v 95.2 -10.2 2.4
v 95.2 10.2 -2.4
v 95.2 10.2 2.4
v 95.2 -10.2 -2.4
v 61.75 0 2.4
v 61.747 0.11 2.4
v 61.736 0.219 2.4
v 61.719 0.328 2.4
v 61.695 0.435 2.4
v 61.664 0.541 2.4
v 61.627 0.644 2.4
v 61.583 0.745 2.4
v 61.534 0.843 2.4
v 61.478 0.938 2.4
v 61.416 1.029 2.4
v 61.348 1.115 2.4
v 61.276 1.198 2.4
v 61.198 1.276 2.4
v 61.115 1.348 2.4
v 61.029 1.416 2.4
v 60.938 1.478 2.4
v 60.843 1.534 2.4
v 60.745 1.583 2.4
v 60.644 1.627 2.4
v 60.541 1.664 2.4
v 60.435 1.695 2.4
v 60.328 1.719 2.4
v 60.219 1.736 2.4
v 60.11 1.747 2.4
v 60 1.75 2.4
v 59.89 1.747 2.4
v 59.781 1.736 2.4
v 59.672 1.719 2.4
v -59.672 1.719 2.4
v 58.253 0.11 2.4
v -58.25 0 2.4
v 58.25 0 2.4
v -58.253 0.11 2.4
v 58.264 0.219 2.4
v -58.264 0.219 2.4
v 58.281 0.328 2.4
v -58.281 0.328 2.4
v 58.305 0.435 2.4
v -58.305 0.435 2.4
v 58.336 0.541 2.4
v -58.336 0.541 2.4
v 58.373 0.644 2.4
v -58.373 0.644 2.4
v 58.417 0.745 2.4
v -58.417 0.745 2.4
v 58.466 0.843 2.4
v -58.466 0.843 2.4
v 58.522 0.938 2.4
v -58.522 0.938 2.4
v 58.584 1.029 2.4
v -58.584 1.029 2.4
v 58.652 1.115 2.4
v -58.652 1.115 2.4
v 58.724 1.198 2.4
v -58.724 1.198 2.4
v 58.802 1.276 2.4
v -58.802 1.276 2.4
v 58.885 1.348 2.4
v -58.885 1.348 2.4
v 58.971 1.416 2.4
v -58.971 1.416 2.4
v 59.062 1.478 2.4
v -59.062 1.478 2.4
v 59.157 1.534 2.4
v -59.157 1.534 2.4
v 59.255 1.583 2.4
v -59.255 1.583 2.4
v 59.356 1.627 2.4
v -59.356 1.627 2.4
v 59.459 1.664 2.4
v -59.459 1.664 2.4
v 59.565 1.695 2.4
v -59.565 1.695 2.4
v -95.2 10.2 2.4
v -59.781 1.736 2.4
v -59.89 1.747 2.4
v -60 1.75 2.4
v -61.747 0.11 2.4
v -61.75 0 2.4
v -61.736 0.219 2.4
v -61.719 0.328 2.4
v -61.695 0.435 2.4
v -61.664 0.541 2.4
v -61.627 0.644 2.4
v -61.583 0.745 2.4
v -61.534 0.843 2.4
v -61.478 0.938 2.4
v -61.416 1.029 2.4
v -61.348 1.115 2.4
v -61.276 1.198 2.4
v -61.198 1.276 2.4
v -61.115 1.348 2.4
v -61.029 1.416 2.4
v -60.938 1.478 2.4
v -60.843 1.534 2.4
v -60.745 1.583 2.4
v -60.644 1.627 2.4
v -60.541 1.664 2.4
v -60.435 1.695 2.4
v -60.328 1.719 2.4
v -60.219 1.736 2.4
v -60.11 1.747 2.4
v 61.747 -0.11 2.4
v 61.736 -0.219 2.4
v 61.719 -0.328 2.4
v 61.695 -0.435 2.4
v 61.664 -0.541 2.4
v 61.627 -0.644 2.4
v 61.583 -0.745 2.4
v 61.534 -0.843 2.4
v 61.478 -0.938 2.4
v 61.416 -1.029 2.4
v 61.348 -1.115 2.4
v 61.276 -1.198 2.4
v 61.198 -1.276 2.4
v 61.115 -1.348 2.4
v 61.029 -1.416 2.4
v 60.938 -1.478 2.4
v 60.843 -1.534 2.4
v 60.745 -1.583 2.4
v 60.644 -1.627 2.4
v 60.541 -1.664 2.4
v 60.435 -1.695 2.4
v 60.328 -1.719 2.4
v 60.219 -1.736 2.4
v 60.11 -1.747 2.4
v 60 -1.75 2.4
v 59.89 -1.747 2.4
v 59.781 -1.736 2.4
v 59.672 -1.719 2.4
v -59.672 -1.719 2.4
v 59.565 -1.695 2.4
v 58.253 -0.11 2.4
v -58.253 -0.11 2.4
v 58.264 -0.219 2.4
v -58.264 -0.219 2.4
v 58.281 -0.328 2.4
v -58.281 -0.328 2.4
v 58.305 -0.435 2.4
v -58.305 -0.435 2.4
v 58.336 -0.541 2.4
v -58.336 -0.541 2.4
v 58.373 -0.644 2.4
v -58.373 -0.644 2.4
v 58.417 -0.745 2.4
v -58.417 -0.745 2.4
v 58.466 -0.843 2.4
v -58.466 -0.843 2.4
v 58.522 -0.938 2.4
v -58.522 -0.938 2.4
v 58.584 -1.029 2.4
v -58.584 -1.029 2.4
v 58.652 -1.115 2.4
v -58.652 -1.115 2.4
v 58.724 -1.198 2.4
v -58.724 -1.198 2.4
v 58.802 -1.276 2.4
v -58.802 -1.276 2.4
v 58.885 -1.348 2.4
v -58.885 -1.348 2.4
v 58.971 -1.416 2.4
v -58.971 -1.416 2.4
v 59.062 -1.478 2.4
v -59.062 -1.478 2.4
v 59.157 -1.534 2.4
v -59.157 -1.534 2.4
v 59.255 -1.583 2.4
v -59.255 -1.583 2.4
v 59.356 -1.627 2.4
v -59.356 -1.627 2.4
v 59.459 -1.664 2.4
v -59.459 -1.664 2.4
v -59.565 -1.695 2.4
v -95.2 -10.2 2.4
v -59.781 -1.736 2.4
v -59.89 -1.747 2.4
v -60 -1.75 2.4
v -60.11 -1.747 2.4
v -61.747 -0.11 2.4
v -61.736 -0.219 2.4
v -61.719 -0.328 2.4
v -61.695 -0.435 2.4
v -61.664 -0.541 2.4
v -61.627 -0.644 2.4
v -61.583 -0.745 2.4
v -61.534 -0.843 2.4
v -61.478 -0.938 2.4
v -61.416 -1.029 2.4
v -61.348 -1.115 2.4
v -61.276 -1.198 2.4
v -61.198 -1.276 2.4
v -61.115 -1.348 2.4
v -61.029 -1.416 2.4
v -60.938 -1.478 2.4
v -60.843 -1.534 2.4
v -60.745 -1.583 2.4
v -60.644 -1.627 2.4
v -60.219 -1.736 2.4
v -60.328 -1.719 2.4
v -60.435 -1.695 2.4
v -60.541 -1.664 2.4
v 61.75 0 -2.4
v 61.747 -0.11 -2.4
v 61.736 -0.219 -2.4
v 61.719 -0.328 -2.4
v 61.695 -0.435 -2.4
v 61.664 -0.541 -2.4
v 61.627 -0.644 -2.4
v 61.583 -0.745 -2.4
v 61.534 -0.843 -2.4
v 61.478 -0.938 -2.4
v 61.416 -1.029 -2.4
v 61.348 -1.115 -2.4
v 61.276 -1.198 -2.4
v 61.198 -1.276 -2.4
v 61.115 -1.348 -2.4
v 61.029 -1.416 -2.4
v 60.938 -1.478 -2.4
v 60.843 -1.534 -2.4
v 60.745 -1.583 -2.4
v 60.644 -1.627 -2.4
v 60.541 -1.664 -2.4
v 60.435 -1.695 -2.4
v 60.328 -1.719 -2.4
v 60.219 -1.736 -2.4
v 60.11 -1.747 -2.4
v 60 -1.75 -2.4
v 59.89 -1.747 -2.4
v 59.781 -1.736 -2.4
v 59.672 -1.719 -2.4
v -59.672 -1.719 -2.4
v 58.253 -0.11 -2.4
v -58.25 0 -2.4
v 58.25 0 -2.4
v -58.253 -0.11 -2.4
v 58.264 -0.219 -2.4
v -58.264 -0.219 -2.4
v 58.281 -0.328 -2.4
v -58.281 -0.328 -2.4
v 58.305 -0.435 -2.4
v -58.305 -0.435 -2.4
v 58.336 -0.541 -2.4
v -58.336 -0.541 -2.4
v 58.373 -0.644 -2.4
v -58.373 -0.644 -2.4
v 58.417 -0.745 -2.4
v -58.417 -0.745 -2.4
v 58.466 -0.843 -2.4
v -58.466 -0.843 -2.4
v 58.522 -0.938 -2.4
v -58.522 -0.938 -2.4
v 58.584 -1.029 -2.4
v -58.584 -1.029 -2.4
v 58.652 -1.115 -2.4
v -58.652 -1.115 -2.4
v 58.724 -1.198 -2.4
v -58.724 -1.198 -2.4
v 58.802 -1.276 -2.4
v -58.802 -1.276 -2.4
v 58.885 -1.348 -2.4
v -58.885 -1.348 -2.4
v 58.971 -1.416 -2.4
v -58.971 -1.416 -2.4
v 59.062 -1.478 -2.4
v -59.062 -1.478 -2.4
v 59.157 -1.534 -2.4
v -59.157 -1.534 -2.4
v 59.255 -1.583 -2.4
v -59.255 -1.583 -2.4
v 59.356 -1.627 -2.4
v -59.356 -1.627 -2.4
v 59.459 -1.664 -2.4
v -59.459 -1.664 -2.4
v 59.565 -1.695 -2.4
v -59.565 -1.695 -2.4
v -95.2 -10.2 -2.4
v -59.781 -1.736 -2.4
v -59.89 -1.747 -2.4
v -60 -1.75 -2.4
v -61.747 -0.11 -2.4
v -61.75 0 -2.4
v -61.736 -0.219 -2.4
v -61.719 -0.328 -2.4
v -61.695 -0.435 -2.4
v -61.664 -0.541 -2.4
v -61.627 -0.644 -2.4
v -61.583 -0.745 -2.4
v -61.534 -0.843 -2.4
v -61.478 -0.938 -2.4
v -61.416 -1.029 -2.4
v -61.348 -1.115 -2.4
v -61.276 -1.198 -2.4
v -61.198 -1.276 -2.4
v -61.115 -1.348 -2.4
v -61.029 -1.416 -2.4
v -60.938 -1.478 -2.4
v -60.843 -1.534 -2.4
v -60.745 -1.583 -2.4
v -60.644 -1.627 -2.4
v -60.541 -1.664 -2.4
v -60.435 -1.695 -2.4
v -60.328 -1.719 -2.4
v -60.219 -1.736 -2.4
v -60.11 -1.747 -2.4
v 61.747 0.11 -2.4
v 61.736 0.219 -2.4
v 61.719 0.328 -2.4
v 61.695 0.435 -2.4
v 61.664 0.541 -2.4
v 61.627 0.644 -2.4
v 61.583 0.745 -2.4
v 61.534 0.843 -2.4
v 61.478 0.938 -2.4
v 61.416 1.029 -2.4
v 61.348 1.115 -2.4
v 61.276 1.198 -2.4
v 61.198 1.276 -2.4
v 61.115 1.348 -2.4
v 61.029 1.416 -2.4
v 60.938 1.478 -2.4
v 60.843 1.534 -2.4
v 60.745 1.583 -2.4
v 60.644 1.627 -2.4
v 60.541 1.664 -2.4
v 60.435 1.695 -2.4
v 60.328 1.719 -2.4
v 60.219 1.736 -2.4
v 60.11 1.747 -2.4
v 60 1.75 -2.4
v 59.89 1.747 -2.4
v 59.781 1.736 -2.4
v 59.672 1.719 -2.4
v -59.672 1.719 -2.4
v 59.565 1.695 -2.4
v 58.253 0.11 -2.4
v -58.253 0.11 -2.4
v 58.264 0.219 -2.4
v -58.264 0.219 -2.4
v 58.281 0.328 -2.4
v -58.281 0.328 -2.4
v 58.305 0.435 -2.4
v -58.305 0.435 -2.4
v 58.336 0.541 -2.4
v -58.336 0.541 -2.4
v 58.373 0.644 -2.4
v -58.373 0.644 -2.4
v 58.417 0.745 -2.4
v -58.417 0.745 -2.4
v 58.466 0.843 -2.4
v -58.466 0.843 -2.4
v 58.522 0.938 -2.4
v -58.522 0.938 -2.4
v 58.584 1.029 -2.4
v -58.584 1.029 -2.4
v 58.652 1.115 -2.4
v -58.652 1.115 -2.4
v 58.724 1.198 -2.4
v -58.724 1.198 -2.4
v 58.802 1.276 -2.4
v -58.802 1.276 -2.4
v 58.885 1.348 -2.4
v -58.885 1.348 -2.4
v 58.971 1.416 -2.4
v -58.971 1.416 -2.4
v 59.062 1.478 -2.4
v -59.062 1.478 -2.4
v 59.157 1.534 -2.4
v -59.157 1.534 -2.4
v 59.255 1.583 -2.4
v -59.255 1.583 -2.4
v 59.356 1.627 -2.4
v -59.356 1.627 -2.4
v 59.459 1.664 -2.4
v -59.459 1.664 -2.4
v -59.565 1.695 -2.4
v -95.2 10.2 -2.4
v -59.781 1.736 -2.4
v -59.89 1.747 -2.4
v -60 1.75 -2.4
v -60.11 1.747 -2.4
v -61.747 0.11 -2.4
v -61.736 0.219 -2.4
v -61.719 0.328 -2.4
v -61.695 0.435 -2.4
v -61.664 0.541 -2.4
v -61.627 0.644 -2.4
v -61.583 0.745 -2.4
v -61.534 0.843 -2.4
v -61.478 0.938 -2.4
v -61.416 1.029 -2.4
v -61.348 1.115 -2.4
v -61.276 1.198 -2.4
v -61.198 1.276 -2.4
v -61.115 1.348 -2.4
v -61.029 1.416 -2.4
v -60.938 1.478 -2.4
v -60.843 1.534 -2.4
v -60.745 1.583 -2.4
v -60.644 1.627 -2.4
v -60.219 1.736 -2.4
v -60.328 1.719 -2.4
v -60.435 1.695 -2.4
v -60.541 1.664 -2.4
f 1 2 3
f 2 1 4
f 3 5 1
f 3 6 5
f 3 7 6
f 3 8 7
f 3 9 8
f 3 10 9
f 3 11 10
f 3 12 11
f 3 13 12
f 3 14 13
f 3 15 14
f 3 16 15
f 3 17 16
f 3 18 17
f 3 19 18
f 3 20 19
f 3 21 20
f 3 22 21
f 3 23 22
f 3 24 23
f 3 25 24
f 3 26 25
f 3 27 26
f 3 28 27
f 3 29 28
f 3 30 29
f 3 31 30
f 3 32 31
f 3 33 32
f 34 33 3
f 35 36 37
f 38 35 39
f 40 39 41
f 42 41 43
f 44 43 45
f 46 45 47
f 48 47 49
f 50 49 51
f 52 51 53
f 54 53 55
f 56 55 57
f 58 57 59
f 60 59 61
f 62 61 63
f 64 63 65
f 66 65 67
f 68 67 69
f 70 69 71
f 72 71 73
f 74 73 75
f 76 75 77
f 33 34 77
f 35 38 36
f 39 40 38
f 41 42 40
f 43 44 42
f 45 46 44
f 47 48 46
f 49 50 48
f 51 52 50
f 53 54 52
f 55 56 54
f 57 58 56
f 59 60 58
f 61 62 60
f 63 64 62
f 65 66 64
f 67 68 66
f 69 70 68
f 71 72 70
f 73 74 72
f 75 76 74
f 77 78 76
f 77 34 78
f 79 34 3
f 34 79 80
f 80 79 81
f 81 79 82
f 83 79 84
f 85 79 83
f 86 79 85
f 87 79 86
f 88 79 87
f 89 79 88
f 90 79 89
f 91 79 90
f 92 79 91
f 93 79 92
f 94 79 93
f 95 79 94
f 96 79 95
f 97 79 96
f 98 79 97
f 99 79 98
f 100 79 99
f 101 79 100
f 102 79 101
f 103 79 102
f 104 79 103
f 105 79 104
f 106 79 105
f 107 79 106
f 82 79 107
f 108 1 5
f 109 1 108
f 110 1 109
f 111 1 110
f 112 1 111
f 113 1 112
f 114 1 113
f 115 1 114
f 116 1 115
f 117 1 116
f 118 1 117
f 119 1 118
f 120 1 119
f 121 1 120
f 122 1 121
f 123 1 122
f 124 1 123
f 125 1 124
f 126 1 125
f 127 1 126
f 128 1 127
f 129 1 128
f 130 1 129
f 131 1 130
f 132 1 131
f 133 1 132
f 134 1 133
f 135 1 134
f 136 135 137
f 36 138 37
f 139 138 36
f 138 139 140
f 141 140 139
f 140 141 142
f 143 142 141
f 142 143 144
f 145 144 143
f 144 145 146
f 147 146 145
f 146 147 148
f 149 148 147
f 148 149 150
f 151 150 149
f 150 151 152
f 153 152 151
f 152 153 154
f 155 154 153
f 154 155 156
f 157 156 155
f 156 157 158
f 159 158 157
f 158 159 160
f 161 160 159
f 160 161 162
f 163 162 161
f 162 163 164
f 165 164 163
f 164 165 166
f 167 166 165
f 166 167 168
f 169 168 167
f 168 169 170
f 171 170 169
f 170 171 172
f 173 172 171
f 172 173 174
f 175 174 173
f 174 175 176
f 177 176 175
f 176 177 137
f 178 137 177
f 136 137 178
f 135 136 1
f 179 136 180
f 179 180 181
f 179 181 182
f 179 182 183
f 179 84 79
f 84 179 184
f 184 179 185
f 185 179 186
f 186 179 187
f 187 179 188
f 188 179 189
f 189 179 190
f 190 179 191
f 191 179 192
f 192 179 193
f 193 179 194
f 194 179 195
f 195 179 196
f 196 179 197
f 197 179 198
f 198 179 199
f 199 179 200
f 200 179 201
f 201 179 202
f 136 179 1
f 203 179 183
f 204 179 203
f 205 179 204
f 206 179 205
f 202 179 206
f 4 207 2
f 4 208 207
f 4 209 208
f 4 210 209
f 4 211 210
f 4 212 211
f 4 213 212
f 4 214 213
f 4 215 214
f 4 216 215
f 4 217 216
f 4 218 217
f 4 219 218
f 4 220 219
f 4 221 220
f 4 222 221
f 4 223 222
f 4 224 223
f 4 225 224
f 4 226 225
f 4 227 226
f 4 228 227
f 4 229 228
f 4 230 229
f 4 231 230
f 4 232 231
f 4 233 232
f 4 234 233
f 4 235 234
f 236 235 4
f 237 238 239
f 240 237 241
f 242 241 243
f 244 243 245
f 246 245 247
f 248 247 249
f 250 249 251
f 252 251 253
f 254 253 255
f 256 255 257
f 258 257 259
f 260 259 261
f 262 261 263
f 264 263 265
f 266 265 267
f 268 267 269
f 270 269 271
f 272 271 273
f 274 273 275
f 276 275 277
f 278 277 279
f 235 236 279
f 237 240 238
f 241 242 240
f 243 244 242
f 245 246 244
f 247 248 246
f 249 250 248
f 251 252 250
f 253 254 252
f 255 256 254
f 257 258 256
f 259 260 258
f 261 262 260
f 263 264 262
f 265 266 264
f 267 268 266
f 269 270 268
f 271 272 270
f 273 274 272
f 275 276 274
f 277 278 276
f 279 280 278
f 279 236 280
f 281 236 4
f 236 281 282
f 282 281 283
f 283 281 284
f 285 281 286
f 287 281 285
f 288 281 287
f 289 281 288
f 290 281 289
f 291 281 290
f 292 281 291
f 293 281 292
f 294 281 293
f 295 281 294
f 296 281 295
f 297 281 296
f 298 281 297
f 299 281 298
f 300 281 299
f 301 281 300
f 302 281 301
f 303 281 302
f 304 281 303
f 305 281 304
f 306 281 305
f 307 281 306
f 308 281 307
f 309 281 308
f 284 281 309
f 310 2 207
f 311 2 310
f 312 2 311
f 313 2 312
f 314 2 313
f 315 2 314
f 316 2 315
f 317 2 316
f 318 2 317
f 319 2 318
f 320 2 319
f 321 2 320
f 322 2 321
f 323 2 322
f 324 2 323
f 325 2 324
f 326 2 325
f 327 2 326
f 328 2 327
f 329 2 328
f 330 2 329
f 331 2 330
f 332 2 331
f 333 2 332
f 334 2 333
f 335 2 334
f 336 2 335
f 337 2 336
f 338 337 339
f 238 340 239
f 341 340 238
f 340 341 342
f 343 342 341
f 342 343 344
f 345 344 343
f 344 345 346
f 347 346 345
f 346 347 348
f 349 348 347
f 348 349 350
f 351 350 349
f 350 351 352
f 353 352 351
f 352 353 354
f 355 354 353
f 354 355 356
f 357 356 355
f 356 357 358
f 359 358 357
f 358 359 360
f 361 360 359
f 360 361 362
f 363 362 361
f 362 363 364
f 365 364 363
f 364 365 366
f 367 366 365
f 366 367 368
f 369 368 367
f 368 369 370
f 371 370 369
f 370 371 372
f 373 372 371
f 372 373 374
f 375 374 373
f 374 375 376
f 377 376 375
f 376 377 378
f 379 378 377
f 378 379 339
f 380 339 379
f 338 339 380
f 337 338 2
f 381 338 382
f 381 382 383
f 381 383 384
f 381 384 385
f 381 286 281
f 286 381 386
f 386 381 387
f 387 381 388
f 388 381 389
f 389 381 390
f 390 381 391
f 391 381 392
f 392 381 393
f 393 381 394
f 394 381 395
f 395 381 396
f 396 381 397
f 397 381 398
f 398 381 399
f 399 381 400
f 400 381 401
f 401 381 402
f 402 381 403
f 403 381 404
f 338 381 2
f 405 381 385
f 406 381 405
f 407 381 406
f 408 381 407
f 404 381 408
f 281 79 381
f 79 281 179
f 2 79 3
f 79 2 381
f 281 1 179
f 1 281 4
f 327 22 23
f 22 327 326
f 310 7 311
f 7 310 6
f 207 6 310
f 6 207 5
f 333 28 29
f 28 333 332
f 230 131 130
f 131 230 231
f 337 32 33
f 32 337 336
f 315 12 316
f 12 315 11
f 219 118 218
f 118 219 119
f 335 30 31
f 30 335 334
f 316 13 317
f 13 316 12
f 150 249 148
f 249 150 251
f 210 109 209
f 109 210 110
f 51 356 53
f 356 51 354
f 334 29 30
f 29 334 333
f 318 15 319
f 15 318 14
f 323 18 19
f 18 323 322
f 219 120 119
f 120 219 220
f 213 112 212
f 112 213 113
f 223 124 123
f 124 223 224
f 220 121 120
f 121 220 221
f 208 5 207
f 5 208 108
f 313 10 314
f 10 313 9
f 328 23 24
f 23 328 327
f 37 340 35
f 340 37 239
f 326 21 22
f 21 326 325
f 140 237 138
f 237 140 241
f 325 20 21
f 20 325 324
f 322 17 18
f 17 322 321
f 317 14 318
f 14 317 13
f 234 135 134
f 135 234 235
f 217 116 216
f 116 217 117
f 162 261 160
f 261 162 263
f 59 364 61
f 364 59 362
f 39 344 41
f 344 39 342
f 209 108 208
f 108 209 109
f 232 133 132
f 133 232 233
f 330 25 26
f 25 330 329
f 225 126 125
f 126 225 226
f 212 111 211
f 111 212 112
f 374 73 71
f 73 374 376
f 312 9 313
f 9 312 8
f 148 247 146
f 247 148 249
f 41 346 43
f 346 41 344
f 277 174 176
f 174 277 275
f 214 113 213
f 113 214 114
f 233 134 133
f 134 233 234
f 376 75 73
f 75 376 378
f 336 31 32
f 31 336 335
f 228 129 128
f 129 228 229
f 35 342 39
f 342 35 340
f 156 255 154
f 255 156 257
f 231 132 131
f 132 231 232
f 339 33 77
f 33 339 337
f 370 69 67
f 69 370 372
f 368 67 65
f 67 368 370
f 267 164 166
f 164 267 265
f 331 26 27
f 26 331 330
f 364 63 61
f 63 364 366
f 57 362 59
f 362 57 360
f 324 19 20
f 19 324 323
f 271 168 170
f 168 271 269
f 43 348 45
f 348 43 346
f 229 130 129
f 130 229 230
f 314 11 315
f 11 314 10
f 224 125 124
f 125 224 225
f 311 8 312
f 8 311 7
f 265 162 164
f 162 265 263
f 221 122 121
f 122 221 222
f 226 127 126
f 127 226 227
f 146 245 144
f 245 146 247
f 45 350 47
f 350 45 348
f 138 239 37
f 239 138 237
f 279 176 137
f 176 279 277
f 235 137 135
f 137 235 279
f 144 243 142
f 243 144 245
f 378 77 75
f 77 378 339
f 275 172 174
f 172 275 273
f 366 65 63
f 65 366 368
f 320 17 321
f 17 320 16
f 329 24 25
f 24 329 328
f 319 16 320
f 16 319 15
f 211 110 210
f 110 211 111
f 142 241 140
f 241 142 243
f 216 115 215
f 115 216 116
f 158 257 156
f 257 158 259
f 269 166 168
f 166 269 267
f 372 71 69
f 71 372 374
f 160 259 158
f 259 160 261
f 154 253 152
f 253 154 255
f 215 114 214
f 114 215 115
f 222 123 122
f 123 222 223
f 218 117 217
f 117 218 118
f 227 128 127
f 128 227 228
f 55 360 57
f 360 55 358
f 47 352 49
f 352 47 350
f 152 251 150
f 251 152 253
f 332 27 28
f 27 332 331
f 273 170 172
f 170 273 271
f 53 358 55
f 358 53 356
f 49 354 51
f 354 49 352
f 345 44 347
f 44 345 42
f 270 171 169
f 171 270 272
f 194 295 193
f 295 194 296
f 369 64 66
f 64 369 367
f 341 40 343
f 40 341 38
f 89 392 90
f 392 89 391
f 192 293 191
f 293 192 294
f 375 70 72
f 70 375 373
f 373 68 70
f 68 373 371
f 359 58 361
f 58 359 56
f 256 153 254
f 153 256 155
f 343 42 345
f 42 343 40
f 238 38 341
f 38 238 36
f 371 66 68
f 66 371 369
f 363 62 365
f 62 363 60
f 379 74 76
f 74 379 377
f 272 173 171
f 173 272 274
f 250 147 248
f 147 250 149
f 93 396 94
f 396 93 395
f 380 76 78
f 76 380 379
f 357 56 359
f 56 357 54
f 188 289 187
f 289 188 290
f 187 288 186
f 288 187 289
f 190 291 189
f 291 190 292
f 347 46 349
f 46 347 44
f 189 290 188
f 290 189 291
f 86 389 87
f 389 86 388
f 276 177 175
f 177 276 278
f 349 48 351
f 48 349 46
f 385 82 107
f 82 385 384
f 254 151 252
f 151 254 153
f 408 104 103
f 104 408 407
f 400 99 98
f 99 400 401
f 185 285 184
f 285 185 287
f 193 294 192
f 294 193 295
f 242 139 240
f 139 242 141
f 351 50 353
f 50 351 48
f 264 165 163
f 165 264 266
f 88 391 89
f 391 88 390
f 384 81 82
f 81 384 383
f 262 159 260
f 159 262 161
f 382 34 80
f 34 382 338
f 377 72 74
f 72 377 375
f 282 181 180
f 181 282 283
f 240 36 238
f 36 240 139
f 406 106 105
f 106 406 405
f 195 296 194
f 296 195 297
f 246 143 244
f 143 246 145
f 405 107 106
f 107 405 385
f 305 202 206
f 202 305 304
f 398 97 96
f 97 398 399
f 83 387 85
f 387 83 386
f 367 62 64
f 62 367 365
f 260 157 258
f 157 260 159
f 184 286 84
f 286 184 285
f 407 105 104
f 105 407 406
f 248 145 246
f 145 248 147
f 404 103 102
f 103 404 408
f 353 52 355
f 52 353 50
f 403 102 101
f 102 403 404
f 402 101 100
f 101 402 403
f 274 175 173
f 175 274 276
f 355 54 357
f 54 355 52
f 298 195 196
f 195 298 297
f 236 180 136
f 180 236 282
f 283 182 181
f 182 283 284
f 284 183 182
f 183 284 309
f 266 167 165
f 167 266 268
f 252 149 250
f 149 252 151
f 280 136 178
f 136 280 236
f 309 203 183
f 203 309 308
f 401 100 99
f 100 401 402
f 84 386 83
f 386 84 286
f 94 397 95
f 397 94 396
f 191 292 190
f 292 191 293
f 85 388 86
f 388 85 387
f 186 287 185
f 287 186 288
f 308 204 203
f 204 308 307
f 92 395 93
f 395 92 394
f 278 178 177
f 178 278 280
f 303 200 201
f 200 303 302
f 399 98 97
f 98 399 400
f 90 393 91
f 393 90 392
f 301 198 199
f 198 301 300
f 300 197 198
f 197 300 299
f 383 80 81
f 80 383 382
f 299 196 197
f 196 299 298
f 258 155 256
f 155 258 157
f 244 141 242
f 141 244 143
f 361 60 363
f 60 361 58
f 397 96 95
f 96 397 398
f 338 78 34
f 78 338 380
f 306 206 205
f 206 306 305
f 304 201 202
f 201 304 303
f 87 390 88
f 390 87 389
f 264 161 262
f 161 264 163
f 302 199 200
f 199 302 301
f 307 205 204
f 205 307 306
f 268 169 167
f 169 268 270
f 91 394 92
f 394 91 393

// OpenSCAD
// file: ../configurations/global.scad
SHOW_FLOPPY_DRIVE = true;
SHOW_BUTTON_ASSETS = true;
SHOW_HOLDER_PIECE = true;
SHOW_8266_FIXATION = true;


symfloppy_box_x_size = 140;
symfloppy_box_y_size = 200;
symfloppy_box_z_size = 30;
symfloppy_box_pane_thickness = 4.8;


button_y_front_offset = 15;
button_x_spaces = 18;
button_x_center_offset = -25;


holder_piece_x_from_z_offset = 5;
holder_piece_y_centered_holder_piece_gap = 120;
// file: subpieces/centeredPaneSubPiece.scad
module centeredPaneSubPiece(x_size, y_size, z_size) {
    cube(
        [
            x_size,
            y_size,
            z_size,
        ],
        center = true
    );
}
// main file
use <./subpieces/centeredPaneSubPiece.scad>
include <../configurations/global.scad>

leftPanePiece();


module leftPanePiece(
    x_size = symfloppy_box_y_size - (symfloppy_box_pane_thickness * 2),
    y_size = symfloppy_box_z_size - (symfloppy_box_pane_thickness * 2),
    pane_thickness = symfloppy_box_pane_thickness,
    holder_piece_y_centered_holder_piece_gap = holder_piece_y_centered_holder_piece_gap
) {
    echo("leftPanePiece", x_size=x_size, y_size=y_size);

    throws_diameter = 3.5;
    _fn = 100;

    difference() {
        centeredPaneSubPiece(x_size, y_size, pane_thickness);

        translate([
            holder_piece_y_centered_holder_piece_gap / 2,
            0,
            0
        ])
            cylinder(d=throws_diameter, h=pane_thickness * 2, center=true, $fn=_fn);

        translate([
            -holder_piece_y_centered_holder_piece_gap / 2,
            0,
            0
        ])
            cylinder(d=throws_diameter, h=pane_thickness * 2, center=true, $fn=_fn);
    }
}
